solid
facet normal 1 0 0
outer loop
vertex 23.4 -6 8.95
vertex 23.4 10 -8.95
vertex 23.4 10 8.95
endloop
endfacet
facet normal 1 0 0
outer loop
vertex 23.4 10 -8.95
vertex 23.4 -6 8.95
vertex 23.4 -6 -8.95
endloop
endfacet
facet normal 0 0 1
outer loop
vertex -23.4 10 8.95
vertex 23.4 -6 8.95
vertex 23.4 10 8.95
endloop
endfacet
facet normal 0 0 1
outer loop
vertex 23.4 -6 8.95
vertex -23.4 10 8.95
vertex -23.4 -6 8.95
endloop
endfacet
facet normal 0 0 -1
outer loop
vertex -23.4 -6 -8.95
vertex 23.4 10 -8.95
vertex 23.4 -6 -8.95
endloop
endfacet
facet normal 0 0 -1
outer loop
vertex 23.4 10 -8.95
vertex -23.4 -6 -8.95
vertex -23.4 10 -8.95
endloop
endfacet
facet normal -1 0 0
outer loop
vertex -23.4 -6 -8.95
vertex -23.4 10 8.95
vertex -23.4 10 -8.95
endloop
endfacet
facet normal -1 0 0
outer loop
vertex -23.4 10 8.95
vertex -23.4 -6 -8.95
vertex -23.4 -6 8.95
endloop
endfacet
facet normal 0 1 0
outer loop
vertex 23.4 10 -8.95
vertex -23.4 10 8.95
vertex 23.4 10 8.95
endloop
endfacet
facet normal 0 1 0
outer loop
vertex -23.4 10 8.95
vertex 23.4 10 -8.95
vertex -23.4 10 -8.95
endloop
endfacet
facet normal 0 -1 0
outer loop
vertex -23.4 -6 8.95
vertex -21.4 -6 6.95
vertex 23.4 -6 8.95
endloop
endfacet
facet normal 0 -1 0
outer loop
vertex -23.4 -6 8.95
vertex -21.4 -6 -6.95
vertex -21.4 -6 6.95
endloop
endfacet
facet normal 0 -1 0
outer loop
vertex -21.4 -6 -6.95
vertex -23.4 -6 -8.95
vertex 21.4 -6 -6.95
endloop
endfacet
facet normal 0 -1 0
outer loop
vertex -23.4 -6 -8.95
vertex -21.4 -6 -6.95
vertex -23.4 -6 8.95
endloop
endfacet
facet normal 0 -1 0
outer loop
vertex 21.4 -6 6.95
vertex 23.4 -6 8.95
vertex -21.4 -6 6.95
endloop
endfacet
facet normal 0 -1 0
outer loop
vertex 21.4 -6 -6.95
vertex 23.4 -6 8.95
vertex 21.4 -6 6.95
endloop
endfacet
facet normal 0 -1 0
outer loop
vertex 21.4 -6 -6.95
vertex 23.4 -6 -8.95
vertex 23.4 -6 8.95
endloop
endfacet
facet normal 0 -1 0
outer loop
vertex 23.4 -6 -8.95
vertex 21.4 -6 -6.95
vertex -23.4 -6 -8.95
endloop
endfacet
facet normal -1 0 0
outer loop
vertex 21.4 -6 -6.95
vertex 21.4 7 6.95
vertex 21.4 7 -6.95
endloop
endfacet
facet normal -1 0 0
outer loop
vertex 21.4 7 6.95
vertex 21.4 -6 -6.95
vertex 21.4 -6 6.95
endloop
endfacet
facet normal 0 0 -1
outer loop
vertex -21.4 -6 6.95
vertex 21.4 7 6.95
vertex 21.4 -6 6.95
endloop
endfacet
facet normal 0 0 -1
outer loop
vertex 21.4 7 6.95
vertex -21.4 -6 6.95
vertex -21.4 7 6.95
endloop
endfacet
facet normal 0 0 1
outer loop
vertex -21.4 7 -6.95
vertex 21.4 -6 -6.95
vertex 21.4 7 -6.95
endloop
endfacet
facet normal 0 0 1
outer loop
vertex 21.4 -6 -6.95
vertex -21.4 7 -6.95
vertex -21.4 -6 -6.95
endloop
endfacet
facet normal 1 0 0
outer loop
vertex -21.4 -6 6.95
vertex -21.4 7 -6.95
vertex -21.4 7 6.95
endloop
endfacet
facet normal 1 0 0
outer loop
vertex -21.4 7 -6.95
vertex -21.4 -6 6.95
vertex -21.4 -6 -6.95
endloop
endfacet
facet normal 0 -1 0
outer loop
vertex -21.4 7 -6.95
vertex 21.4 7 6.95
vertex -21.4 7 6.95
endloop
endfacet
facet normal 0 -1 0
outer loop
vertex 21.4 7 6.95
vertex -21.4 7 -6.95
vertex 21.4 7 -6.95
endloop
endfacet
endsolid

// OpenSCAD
boxLength = 129.7;
boxWidth = 38.8;
boxHeight = 9.9;
thickness = 2;
lidLength = 14;


difference (){
    translate([0,thickness,0])
        cube([boxWidth + thickness * 4, lidLength + thickness, boxHeight + thickness * 4], center = true);
    cube([boxWidth + thickness * 2, lidLength, boxHeight + thickness * 2], center = true);
}
